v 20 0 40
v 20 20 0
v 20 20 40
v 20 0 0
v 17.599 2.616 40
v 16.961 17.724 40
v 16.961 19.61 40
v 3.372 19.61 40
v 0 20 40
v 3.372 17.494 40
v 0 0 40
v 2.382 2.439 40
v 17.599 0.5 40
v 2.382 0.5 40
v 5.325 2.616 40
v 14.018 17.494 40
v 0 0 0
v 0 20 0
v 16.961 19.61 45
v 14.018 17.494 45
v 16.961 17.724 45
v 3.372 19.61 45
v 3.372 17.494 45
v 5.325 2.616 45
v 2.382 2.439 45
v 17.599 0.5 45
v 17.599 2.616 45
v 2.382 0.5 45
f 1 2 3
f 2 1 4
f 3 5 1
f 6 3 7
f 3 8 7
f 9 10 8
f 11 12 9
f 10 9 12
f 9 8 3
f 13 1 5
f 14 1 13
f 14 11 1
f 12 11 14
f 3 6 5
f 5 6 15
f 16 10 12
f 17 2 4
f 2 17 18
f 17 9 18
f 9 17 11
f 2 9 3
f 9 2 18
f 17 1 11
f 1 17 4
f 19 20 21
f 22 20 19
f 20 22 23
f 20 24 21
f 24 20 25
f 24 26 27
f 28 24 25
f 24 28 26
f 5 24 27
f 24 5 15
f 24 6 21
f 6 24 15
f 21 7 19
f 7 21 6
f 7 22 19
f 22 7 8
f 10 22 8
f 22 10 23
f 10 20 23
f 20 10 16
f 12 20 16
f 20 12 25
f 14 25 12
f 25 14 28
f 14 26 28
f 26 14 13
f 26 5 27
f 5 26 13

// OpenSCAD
cube([20, 20, 40]);
translate([1.5, 0.5, 40]){
    linear_extrude(5){
        text("Z", size=20);
    }
}
